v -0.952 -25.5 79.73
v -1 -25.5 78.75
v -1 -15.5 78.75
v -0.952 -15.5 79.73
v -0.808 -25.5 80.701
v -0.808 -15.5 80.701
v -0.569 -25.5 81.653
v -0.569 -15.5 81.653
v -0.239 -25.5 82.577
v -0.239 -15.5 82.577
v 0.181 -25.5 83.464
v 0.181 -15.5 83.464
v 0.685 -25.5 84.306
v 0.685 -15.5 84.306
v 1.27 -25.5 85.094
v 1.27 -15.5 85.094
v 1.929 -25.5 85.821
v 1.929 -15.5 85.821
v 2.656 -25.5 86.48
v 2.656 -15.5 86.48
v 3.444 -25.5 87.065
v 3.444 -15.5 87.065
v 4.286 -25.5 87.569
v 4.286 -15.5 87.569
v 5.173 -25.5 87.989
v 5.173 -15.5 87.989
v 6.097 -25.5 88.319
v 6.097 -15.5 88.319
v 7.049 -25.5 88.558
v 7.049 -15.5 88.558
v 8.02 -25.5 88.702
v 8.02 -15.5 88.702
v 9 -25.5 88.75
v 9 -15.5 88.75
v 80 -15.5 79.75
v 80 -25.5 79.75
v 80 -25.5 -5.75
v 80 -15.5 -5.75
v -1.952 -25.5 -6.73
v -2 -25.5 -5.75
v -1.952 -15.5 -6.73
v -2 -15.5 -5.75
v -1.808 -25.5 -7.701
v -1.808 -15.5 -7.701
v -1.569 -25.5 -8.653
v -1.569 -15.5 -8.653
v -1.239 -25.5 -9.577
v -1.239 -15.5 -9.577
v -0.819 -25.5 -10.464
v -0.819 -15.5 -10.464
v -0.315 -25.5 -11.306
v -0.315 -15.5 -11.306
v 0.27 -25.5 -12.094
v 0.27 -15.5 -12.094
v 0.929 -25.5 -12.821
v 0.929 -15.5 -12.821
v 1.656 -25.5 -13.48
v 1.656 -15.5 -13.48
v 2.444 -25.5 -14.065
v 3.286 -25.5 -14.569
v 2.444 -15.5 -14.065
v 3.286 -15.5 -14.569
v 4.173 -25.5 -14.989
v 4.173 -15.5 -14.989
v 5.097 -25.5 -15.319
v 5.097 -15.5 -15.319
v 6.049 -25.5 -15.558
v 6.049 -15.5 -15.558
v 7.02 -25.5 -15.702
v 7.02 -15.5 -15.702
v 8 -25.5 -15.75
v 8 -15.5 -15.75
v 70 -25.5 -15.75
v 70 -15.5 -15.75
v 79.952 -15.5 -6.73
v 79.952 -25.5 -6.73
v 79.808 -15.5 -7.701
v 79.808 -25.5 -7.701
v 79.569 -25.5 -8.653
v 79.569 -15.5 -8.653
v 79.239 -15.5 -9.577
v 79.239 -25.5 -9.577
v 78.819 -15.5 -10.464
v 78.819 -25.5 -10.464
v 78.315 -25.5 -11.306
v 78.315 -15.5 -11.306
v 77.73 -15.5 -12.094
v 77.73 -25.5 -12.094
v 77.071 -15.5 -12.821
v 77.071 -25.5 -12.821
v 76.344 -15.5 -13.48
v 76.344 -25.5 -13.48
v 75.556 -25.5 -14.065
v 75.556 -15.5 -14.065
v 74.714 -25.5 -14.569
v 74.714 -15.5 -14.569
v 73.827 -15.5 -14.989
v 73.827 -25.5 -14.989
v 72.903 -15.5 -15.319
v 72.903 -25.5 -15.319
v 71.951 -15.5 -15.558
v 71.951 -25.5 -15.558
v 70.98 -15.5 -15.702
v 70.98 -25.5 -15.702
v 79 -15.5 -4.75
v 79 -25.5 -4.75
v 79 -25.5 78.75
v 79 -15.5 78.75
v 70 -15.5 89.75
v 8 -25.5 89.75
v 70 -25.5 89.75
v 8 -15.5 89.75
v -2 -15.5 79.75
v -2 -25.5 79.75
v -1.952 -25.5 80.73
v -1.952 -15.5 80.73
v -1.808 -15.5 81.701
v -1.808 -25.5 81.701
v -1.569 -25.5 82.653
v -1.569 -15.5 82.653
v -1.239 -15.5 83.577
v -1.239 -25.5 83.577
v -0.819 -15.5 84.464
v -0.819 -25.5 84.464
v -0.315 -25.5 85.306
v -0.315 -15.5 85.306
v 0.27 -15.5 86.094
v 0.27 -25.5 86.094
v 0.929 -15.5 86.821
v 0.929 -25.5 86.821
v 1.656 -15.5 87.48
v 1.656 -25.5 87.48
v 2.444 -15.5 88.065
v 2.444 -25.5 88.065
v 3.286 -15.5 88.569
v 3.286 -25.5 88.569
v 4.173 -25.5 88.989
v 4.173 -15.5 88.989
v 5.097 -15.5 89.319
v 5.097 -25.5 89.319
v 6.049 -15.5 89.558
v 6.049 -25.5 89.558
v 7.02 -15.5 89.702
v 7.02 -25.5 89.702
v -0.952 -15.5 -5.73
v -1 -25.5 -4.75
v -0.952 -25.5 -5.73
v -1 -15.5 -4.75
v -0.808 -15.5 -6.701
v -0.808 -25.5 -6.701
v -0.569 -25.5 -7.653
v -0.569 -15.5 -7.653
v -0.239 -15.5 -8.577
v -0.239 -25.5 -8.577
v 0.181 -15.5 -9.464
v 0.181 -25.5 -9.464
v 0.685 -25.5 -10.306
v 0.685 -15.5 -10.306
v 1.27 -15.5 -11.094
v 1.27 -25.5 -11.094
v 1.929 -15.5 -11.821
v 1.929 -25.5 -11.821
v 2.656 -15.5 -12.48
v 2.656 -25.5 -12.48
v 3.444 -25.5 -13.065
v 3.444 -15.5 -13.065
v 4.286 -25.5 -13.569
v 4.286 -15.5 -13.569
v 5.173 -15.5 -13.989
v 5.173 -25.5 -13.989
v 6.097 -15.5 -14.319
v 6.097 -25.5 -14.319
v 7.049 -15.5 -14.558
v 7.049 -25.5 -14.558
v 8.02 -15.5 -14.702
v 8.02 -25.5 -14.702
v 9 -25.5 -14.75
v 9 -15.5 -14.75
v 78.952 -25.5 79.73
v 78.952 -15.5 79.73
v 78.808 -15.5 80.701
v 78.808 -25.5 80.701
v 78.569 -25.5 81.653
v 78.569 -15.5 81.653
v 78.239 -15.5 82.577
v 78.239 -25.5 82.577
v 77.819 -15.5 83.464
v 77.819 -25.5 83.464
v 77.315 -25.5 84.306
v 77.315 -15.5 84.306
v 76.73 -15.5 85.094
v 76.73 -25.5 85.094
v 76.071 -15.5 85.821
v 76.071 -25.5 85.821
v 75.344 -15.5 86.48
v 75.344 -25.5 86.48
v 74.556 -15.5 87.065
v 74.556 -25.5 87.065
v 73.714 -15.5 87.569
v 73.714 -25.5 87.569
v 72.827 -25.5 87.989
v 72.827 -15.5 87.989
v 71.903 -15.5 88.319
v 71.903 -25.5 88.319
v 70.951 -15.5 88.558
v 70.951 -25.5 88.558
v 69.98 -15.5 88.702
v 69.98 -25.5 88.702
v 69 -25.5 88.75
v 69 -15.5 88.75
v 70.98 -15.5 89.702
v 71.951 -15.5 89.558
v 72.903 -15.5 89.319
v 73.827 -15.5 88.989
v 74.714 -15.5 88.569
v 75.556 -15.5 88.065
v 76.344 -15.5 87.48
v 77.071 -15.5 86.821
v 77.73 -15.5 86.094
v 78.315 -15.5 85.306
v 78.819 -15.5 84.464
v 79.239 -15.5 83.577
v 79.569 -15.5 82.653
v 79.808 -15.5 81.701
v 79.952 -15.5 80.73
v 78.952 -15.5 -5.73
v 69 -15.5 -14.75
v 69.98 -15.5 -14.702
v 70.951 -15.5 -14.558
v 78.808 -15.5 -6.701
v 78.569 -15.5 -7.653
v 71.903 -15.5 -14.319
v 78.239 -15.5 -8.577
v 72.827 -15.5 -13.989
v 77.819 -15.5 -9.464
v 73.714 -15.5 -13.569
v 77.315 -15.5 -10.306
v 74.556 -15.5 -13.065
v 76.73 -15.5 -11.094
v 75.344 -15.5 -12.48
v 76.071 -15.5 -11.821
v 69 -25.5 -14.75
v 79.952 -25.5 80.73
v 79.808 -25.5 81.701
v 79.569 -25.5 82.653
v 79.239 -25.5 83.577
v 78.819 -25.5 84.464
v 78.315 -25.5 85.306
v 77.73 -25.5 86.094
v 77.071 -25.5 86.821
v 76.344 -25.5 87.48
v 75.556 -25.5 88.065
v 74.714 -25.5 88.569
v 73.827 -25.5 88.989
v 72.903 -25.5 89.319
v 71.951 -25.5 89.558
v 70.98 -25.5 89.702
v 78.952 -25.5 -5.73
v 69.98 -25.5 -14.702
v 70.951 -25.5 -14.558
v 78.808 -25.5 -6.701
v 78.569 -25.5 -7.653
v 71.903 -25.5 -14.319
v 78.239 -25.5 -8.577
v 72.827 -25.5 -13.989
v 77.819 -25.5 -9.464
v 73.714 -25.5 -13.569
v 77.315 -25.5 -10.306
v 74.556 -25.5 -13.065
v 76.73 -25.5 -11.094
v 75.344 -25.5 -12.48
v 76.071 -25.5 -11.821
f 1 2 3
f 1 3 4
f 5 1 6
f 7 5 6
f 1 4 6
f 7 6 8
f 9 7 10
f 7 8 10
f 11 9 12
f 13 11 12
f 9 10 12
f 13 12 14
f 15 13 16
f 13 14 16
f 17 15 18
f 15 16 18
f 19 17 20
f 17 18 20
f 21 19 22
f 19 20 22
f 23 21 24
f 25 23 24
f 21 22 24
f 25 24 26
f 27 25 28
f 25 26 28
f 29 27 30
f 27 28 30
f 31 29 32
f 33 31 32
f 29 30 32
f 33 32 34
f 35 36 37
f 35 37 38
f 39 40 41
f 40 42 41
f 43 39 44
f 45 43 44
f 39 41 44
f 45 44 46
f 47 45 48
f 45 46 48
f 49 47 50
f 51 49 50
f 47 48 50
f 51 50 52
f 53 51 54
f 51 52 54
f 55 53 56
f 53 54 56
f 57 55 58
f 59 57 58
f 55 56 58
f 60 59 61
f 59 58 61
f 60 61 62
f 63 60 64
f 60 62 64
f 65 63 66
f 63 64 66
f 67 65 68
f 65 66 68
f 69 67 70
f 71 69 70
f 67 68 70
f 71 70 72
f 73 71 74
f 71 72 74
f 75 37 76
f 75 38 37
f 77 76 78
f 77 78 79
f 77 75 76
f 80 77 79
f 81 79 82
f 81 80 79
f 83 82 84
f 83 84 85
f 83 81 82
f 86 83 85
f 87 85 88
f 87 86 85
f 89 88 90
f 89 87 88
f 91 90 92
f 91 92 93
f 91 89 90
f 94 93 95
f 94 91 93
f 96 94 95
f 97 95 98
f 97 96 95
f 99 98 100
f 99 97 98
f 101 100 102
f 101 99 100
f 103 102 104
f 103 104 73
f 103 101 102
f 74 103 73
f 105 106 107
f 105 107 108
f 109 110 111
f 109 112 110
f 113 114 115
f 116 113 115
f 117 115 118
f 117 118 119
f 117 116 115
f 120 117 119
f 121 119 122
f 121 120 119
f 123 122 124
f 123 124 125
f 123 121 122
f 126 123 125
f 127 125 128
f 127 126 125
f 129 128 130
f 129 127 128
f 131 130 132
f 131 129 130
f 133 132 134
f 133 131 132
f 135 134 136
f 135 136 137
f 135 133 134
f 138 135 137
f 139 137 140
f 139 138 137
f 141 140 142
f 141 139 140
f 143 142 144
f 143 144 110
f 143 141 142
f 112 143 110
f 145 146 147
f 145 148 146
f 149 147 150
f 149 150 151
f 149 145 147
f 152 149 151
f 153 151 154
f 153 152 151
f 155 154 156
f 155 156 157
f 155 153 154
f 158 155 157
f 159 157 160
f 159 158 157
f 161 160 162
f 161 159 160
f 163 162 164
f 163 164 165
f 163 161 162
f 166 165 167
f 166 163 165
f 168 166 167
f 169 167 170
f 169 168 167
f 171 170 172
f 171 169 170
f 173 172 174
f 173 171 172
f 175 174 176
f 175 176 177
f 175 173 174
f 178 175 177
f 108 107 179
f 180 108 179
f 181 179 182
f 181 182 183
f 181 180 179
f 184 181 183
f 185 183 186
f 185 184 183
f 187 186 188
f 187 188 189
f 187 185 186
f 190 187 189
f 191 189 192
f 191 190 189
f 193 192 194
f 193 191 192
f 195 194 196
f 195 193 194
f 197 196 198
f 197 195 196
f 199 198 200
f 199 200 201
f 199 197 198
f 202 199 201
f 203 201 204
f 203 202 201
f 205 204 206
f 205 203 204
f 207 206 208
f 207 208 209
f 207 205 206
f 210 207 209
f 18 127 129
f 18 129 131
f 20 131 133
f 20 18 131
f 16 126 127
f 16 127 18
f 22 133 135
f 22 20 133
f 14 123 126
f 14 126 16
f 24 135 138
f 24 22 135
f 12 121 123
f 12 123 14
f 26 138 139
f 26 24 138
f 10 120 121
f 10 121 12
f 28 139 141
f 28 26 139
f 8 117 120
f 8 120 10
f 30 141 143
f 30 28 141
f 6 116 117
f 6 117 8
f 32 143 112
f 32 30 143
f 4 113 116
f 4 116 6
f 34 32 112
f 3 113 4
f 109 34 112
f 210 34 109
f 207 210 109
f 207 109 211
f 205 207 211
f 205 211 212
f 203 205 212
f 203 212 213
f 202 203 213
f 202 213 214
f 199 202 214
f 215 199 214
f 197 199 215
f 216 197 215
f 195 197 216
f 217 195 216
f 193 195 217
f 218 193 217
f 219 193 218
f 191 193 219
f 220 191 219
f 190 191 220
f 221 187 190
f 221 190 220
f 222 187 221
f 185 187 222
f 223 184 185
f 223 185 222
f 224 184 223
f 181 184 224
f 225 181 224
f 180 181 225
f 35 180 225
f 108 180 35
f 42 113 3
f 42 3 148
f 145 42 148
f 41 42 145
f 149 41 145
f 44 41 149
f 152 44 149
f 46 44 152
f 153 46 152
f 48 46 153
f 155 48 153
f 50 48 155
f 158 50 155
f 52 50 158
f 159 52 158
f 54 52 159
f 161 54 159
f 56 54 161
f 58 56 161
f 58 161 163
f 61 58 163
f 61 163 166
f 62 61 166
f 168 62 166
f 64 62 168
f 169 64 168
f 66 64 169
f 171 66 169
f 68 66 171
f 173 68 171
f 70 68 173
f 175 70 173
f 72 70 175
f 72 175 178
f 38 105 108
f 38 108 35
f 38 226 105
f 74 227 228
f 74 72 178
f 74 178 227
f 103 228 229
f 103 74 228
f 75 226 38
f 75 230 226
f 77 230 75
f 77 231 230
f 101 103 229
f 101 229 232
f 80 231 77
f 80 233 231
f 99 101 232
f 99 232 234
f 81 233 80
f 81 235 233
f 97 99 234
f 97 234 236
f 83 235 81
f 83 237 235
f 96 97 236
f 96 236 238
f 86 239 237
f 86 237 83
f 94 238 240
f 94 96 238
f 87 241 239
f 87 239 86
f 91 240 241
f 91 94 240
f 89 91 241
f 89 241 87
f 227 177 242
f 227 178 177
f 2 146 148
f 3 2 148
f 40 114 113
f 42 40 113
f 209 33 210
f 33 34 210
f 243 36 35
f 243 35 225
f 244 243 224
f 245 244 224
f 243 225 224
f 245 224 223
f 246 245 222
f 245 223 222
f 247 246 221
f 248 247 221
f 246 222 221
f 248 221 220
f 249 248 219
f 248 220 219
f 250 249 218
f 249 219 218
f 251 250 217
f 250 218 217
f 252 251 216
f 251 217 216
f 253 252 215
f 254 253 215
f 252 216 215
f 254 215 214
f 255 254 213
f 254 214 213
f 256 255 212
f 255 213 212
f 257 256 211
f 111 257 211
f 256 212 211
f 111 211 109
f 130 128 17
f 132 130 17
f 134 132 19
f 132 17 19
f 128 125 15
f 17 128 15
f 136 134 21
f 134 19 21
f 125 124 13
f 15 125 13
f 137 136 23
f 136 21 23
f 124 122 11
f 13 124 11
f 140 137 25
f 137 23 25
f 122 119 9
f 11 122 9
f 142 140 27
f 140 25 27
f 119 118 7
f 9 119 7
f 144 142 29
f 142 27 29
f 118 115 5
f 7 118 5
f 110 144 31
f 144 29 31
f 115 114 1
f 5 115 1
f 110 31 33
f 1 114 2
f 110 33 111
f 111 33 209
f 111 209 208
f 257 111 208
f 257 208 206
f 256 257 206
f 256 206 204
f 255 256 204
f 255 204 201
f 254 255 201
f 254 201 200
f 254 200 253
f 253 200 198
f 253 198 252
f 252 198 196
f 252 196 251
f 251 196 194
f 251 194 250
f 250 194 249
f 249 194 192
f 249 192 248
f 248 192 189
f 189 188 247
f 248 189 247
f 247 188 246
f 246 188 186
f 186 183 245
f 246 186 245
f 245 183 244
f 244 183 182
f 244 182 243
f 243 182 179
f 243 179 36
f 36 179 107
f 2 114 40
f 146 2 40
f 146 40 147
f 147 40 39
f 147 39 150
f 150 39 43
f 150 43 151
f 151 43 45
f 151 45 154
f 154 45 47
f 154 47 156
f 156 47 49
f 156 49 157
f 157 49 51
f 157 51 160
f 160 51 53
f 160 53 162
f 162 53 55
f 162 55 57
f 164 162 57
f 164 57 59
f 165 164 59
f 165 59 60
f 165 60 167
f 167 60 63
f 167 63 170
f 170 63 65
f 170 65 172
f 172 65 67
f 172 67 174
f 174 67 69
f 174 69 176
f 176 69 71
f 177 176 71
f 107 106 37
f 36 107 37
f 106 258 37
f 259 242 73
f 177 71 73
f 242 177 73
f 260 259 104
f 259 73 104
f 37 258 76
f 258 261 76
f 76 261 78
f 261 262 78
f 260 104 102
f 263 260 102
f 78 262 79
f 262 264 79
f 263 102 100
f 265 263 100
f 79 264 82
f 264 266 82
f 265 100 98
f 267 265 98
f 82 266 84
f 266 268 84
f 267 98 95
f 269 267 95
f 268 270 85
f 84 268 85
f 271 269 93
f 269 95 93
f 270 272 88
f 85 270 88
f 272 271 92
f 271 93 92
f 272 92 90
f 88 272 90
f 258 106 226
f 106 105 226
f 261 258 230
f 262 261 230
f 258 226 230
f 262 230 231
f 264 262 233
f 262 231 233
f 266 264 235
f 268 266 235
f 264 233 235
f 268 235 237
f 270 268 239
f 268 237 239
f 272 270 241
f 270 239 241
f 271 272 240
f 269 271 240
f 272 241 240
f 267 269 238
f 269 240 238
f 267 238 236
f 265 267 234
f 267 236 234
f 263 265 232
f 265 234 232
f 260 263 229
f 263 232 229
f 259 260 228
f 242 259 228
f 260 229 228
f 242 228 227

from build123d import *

# Parameters (mm, degrees)
BOX028_W     = 80
BOX028_H     = 10
BOX028_DEPTH = 103.5
FILLET033_R  = 10
BOX029_W     = 82
BOX029_H     = 10
BOX029_DEPTH = 105.5
FILLET034_R  = 10


with BuildPart() as topridge002:
    # Box028 → Box028 (new body)
    with BuildSketch(Plane(origin=(-1, -26, -14.75), x_dir=(1, 0, 0), z_dir=(0, 0, 1))):
        with Locations((40, 5)):
            Rectangle(BOX028_W, BOX028_H)
    extrude(amount=BOX028_DEPTH)

    # Fillet033
    fillet033_edges = [topridge002.edges().sort_by_distance(p)[0] for p in [
        (-1, -21, 88.75),
        (-1, -21, -14.75),
        (79, -21, 88.75),
        (79, -21, -14.75),
    ]]
    fillet(fillet033_edges, radius=FILLET033_R)


with BuildPart() as topridge002_1:
    # Fillet033 placement: moved
    add(topridge002.part.moved(Location((0, 0.5, 0))))


with BuildPart() as topcut:
    # Box029 → Box029 (new body)
    with BuildSketch(Plane(origin=(-2, -27, -15.75), x_dir=(1, 0, 0), z_dir=(0, 0, 1))):
        with Locations((41, 5)):
            Rectangle(BOX029_W, BOX029_H)
    extrude(amount=BOX029_DEPTH)

    # Fillet034
    fillet034_edges = [topcut.edges().sort_by_distance(p)[0] for p in [
        (-2, -22, 89.75),
        (-2, -22, -15.75),
        (80, -22, 89.75),
        (80, -22, -15.75),
    ]]
    fillet(fillet034_edges, radius=FILLET034_R)


with BuildPart() as topcut_1:
    # Fillet034 placement: moved
    add(topcut.part.moved(Location((0, 1.5, 0))))

    # Cut009: cut topRidge002
    add(topridge002_1.part, mode=Mode.SUBTRACT)


solid = topcut_1.part
